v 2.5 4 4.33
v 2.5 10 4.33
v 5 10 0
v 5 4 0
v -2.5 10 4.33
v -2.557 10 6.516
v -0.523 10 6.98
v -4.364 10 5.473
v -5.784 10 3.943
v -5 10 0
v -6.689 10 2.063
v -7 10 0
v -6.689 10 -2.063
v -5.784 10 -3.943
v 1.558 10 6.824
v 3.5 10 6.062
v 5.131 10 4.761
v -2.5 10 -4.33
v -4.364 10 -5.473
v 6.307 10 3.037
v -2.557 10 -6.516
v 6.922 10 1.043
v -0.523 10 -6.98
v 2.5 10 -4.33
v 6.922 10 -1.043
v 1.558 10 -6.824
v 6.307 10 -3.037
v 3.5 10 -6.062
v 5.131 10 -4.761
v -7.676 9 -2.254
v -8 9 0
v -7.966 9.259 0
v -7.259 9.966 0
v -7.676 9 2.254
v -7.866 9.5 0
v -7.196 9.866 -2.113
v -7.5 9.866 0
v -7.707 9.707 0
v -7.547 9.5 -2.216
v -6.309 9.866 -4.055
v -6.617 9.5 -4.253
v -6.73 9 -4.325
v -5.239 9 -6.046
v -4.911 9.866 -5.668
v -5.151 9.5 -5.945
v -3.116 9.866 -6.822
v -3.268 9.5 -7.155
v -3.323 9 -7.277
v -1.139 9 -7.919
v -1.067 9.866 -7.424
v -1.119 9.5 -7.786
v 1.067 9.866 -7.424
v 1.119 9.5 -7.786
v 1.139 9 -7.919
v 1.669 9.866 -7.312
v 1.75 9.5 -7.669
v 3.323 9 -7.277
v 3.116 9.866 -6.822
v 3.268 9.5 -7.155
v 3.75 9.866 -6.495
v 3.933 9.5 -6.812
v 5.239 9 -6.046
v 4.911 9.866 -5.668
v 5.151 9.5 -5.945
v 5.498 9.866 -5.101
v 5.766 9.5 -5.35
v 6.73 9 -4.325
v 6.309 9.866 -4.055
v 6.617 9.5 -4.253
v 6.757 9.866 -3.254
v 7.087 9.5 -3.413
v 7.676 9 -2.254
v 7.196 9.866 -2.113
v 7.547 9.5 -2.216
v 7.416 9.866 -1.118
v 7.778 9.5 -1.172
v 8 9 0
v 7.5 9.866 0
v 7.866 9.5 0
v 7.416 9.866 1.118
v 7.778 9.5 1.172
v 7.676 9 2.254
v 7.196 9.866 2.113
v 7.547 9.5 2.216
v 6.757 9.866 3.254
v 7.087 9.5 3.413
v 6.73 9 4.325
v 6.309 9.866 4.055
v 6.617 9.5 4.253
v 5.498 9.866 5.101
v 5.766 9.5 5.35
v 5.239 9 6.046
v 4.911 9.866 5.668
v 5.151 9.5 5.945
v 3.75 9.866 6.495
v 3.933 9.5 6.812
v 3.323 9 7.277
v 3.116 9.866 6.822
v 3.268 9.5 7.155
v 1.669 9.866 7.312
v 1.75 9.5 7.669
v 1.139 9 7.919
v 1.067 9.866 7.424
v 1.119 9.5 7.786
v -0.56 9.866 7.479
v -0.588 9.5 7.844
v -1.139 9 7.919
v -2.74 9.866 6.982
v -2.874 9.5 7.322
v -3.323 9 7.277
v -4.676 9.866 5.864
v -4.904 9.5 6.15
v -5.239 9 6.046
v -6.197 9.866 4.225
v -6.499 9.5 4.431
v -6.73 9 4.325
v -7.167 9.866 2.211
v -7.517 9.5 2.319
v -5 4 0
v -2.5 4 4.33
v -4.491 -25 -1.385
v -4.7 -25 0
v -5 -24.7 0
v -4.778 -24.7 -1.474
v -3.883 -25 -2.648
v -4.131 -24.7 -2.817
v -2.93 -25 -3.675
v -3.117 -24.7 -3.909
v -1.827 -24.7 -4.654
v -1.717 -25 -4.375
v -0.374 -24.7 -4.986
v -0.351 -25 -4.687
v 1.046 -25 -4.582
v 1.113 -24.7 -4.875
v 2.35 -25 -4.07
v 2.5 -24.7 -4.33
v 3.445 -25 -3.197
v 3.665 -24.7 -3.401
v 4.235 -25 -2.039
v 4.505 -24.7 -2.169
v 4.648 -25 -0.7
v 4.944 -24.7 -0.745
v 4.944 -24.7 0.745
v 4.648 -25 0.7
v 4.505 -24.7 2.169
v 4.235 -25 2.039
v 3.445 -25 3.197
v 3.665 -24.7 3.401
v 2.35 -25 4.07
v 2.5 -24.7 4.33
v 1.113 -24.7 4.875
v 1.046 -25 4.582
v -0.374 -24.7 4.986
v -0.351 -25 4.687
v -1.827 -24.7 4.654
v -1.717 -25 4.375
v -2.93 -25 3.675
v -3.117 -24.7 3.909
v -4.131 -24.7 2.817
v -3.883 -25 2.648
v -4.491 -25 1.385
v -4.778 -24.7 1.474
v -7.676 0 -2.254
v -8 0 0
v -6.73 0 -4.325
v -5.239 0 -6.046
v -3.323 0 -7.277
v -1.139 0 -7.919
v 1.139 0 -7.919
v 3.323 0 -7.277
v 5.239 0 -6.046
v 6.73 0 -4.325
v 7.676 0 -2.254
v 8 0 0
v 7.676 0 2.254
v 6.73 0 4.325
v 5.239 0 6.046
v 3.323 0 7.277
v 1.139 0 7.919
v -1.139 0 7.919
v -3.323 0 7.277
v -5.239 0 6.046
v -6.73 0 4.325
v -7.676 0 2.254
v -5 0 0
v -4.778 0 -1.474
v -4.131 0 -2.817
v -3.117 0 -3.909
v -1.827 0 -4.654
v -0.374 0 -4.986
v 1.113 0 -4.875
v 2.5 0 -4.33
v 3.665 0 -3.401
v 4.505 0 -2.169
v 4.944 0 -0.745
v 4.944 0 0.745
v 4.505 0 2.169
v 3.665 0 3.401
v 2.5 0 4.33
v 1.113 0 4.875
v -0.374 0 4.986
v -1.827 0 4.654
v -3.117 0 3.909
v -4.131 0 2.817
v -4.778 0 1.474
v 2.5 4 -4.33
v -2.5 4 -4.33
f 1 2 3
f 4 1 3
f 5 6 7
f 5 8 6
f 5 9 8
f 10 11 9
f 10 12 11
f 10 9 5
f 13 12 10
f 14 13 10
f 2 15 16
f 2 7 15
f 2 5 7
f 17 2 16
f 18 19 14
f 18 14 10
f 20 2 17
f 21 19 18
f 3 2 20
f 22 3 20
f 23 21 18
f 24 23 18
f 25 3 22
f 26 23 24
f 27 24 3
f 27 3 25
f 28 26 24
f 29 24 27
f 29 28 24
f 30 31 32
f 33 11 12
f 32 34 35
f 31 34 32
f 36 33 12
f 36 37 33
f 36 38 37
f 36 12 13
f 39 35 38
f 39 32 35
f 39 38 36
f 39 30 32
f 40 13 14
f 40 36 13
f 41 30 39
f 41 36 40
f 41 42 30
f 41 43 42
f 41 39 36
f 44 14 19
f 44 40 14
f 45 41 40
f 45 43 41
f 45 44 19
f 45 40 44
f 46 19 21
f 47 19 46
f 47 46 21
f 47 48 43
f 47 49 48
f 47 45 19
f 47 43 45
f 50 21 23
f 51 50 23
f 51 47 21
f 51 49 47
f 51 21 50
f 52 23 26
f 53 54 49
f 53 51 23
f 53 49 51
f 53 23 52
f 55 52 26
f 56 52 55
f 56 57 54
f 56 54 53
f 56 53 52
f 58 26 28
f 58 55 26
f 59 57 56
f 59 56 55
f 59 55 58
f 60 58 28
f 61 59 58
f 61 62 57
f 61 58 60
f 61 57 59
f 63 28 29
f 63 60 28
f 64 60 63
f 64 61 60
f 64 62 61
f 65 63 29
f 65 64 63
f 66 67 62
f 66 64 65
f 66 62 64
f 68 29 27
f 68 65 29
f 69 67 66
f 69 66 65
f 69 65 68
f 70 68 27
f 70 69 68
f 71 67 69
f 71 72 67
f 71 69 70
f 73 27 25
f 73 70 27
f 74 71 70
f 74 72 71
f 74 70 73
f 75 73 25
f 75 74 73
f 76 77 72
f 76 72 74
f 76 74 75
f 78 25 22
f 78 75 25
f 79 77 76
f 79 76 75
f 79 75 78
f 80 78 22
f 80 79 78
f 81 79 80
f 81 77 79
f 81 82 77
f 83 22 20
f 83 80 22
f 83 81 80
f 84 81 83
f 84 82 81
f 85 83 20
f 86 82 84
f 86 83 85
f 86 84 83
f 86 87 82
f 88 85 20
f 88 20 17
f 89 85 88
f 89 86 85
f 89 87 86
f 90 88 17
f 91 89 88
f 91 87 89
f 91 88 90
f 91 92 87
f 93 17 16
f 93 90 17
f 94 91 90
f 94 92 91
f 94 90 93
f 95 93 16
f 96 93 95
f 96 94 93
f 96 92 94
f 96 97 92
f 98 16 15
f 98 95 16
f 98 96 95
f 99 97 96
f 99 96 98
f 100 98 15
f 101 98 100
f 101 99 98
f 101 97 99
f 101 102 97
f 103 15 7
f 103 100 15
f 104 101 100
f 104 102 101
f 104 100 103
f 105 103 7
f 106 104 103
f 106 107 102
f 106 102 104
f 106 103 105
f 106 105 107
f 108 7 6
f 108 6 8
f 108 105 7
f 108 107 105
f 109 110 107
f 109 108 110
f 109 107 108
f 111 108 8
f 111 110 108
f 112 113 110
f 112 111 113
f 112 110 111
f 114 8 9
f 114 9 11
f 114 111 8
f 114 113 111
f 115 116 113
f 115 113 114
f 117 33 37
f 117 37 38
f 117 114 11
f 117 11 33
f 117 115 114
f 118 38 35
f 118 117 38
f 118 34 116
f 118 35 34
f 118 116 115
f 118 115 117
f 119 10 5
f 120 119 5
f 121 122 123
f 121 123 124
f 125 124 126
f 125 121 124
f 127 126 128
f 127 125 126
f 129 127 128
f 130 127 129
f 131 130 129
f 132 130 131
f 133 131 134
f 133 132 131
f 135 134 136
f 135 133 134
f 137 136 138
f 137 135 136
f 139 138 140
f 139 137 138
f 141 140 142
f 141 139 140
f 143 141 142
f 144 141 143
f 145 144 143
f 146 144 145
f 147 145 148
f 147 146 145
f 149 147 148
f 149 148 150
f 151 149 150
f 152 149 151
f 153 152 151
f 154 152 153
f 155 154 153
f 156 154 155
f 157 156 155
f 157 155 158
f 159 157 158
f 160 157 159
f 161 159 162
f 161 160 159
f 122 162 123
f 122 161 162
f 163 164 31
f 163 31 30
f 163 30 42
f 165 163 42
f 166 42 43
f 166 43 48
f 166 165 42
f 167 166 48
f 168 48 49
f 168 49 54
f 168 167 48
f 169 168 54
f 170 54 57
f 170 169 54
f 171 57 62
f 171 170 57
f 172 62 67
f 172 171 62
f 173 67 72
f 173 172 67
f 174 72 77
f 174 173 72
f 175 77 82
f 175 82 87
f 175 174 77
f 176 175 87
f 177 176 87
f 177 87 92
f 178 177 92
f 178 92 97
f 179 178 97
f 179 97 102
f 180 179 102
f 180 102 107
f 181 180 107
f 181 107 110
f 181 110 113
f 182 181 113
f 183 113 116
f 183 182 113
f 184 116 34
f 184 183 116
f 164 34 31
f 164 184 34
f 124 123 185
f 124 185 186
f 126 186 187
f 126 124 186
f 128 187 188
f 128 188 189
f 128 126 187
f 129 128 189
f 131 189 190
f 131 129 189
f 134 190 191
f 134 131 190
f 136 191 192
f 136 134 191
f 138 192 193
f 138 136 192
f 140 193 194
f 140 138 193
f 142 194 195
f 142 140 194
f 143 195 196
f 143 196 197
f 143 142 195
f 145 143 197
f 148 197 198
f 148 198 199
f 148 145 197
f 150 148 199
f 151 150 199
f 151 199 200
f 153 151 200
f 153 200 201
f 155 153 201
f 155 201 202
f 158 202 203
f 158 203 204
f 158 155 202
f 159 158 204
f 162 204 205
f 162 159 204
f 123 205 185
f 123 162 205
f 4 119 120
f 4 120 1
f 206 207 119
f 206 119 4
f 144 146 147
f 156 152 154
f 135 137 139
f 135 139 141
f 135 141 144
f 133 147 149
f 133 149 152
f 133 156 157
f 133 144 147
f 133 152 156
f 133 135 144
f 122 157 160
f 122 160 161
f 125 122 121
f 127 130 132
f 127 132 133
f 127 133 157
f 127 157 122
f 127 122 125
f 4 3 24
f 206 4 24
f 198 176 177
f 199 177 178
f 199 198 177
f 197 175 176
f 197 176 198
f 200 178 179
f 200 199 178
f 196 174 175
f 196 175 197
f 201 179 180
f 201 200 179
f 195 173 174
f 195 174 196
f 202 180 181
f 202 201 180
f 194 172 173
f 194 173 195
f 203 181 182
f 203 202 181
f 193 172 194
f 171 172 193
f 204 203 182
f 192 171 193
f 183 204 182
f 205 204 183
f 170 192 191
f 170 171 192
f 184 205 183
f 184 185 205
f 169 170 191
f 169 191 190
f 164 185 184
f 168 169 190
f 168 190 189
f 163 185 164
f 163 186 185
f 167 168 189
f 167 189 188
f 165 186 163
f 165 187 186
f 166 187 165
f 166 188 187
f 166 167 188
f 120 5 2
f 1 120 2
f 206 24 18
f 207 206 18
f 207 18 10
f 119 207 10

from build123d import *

# Parameters (mm, degrees)
FILLET_1_R          = 1
CUT_EXTRUDE_START   = 10
CUT_EXTRUDE_1_DEPTH = 6
CHAMFER_1_SIZE      = 0.3


with BuildPart() as part:
    # 草图1 → 旋转1 (revolve)
    with BuildSketch(Plane.XY, mode=Mode.PRIVATE) as revolve_1_sk:
        Polygon((0, 10), (8, 10), (8, 0), (5, 0), (5, -25), (0, -25), align=None)
    revolve(revolve_1_sk.sketch.rotate(Axis((0, 10, 0), (0, -1, 0)), 180), axis=Axis((0, 10, 0), (0, -1, 0)))

    # 圆角1
    fillet_1_edges = [part.edges().sort_by_distance(p)[0] for p in [
        (8, 10, 0),
    ]]
    fillet(fillet_1_edges, radius=FILLET_1_R)

    # 草图2 → 切除-拉伸1 (cut)
    with BuildSketch(Plane(origin=(0, 0, 0), x_dir=(1, 0, 0), z_dir=(0, 1, 0)).offset(CUT_EXTRUDE_START)):
        Polygon((5, 0), (2.5, 4.330127019), (-2.5, 4.330127019), (-5, 0), (-2.5, -4.330127019), (2.5, -4.330127019), align=None)
    extrude(amount=-CUT_EXTRUDE_1_DEPTH, mode=Mode.SUBTRACT)

    # 倒角1
    chamfer_1_edges = [part.edges().sort_by_distance(p)[0] for p in [
        (5, -25, 0),
    ]]
    chamfer(chamfer_1_edges, length=CHAMFER_1_SIZE)


solid = part.part
